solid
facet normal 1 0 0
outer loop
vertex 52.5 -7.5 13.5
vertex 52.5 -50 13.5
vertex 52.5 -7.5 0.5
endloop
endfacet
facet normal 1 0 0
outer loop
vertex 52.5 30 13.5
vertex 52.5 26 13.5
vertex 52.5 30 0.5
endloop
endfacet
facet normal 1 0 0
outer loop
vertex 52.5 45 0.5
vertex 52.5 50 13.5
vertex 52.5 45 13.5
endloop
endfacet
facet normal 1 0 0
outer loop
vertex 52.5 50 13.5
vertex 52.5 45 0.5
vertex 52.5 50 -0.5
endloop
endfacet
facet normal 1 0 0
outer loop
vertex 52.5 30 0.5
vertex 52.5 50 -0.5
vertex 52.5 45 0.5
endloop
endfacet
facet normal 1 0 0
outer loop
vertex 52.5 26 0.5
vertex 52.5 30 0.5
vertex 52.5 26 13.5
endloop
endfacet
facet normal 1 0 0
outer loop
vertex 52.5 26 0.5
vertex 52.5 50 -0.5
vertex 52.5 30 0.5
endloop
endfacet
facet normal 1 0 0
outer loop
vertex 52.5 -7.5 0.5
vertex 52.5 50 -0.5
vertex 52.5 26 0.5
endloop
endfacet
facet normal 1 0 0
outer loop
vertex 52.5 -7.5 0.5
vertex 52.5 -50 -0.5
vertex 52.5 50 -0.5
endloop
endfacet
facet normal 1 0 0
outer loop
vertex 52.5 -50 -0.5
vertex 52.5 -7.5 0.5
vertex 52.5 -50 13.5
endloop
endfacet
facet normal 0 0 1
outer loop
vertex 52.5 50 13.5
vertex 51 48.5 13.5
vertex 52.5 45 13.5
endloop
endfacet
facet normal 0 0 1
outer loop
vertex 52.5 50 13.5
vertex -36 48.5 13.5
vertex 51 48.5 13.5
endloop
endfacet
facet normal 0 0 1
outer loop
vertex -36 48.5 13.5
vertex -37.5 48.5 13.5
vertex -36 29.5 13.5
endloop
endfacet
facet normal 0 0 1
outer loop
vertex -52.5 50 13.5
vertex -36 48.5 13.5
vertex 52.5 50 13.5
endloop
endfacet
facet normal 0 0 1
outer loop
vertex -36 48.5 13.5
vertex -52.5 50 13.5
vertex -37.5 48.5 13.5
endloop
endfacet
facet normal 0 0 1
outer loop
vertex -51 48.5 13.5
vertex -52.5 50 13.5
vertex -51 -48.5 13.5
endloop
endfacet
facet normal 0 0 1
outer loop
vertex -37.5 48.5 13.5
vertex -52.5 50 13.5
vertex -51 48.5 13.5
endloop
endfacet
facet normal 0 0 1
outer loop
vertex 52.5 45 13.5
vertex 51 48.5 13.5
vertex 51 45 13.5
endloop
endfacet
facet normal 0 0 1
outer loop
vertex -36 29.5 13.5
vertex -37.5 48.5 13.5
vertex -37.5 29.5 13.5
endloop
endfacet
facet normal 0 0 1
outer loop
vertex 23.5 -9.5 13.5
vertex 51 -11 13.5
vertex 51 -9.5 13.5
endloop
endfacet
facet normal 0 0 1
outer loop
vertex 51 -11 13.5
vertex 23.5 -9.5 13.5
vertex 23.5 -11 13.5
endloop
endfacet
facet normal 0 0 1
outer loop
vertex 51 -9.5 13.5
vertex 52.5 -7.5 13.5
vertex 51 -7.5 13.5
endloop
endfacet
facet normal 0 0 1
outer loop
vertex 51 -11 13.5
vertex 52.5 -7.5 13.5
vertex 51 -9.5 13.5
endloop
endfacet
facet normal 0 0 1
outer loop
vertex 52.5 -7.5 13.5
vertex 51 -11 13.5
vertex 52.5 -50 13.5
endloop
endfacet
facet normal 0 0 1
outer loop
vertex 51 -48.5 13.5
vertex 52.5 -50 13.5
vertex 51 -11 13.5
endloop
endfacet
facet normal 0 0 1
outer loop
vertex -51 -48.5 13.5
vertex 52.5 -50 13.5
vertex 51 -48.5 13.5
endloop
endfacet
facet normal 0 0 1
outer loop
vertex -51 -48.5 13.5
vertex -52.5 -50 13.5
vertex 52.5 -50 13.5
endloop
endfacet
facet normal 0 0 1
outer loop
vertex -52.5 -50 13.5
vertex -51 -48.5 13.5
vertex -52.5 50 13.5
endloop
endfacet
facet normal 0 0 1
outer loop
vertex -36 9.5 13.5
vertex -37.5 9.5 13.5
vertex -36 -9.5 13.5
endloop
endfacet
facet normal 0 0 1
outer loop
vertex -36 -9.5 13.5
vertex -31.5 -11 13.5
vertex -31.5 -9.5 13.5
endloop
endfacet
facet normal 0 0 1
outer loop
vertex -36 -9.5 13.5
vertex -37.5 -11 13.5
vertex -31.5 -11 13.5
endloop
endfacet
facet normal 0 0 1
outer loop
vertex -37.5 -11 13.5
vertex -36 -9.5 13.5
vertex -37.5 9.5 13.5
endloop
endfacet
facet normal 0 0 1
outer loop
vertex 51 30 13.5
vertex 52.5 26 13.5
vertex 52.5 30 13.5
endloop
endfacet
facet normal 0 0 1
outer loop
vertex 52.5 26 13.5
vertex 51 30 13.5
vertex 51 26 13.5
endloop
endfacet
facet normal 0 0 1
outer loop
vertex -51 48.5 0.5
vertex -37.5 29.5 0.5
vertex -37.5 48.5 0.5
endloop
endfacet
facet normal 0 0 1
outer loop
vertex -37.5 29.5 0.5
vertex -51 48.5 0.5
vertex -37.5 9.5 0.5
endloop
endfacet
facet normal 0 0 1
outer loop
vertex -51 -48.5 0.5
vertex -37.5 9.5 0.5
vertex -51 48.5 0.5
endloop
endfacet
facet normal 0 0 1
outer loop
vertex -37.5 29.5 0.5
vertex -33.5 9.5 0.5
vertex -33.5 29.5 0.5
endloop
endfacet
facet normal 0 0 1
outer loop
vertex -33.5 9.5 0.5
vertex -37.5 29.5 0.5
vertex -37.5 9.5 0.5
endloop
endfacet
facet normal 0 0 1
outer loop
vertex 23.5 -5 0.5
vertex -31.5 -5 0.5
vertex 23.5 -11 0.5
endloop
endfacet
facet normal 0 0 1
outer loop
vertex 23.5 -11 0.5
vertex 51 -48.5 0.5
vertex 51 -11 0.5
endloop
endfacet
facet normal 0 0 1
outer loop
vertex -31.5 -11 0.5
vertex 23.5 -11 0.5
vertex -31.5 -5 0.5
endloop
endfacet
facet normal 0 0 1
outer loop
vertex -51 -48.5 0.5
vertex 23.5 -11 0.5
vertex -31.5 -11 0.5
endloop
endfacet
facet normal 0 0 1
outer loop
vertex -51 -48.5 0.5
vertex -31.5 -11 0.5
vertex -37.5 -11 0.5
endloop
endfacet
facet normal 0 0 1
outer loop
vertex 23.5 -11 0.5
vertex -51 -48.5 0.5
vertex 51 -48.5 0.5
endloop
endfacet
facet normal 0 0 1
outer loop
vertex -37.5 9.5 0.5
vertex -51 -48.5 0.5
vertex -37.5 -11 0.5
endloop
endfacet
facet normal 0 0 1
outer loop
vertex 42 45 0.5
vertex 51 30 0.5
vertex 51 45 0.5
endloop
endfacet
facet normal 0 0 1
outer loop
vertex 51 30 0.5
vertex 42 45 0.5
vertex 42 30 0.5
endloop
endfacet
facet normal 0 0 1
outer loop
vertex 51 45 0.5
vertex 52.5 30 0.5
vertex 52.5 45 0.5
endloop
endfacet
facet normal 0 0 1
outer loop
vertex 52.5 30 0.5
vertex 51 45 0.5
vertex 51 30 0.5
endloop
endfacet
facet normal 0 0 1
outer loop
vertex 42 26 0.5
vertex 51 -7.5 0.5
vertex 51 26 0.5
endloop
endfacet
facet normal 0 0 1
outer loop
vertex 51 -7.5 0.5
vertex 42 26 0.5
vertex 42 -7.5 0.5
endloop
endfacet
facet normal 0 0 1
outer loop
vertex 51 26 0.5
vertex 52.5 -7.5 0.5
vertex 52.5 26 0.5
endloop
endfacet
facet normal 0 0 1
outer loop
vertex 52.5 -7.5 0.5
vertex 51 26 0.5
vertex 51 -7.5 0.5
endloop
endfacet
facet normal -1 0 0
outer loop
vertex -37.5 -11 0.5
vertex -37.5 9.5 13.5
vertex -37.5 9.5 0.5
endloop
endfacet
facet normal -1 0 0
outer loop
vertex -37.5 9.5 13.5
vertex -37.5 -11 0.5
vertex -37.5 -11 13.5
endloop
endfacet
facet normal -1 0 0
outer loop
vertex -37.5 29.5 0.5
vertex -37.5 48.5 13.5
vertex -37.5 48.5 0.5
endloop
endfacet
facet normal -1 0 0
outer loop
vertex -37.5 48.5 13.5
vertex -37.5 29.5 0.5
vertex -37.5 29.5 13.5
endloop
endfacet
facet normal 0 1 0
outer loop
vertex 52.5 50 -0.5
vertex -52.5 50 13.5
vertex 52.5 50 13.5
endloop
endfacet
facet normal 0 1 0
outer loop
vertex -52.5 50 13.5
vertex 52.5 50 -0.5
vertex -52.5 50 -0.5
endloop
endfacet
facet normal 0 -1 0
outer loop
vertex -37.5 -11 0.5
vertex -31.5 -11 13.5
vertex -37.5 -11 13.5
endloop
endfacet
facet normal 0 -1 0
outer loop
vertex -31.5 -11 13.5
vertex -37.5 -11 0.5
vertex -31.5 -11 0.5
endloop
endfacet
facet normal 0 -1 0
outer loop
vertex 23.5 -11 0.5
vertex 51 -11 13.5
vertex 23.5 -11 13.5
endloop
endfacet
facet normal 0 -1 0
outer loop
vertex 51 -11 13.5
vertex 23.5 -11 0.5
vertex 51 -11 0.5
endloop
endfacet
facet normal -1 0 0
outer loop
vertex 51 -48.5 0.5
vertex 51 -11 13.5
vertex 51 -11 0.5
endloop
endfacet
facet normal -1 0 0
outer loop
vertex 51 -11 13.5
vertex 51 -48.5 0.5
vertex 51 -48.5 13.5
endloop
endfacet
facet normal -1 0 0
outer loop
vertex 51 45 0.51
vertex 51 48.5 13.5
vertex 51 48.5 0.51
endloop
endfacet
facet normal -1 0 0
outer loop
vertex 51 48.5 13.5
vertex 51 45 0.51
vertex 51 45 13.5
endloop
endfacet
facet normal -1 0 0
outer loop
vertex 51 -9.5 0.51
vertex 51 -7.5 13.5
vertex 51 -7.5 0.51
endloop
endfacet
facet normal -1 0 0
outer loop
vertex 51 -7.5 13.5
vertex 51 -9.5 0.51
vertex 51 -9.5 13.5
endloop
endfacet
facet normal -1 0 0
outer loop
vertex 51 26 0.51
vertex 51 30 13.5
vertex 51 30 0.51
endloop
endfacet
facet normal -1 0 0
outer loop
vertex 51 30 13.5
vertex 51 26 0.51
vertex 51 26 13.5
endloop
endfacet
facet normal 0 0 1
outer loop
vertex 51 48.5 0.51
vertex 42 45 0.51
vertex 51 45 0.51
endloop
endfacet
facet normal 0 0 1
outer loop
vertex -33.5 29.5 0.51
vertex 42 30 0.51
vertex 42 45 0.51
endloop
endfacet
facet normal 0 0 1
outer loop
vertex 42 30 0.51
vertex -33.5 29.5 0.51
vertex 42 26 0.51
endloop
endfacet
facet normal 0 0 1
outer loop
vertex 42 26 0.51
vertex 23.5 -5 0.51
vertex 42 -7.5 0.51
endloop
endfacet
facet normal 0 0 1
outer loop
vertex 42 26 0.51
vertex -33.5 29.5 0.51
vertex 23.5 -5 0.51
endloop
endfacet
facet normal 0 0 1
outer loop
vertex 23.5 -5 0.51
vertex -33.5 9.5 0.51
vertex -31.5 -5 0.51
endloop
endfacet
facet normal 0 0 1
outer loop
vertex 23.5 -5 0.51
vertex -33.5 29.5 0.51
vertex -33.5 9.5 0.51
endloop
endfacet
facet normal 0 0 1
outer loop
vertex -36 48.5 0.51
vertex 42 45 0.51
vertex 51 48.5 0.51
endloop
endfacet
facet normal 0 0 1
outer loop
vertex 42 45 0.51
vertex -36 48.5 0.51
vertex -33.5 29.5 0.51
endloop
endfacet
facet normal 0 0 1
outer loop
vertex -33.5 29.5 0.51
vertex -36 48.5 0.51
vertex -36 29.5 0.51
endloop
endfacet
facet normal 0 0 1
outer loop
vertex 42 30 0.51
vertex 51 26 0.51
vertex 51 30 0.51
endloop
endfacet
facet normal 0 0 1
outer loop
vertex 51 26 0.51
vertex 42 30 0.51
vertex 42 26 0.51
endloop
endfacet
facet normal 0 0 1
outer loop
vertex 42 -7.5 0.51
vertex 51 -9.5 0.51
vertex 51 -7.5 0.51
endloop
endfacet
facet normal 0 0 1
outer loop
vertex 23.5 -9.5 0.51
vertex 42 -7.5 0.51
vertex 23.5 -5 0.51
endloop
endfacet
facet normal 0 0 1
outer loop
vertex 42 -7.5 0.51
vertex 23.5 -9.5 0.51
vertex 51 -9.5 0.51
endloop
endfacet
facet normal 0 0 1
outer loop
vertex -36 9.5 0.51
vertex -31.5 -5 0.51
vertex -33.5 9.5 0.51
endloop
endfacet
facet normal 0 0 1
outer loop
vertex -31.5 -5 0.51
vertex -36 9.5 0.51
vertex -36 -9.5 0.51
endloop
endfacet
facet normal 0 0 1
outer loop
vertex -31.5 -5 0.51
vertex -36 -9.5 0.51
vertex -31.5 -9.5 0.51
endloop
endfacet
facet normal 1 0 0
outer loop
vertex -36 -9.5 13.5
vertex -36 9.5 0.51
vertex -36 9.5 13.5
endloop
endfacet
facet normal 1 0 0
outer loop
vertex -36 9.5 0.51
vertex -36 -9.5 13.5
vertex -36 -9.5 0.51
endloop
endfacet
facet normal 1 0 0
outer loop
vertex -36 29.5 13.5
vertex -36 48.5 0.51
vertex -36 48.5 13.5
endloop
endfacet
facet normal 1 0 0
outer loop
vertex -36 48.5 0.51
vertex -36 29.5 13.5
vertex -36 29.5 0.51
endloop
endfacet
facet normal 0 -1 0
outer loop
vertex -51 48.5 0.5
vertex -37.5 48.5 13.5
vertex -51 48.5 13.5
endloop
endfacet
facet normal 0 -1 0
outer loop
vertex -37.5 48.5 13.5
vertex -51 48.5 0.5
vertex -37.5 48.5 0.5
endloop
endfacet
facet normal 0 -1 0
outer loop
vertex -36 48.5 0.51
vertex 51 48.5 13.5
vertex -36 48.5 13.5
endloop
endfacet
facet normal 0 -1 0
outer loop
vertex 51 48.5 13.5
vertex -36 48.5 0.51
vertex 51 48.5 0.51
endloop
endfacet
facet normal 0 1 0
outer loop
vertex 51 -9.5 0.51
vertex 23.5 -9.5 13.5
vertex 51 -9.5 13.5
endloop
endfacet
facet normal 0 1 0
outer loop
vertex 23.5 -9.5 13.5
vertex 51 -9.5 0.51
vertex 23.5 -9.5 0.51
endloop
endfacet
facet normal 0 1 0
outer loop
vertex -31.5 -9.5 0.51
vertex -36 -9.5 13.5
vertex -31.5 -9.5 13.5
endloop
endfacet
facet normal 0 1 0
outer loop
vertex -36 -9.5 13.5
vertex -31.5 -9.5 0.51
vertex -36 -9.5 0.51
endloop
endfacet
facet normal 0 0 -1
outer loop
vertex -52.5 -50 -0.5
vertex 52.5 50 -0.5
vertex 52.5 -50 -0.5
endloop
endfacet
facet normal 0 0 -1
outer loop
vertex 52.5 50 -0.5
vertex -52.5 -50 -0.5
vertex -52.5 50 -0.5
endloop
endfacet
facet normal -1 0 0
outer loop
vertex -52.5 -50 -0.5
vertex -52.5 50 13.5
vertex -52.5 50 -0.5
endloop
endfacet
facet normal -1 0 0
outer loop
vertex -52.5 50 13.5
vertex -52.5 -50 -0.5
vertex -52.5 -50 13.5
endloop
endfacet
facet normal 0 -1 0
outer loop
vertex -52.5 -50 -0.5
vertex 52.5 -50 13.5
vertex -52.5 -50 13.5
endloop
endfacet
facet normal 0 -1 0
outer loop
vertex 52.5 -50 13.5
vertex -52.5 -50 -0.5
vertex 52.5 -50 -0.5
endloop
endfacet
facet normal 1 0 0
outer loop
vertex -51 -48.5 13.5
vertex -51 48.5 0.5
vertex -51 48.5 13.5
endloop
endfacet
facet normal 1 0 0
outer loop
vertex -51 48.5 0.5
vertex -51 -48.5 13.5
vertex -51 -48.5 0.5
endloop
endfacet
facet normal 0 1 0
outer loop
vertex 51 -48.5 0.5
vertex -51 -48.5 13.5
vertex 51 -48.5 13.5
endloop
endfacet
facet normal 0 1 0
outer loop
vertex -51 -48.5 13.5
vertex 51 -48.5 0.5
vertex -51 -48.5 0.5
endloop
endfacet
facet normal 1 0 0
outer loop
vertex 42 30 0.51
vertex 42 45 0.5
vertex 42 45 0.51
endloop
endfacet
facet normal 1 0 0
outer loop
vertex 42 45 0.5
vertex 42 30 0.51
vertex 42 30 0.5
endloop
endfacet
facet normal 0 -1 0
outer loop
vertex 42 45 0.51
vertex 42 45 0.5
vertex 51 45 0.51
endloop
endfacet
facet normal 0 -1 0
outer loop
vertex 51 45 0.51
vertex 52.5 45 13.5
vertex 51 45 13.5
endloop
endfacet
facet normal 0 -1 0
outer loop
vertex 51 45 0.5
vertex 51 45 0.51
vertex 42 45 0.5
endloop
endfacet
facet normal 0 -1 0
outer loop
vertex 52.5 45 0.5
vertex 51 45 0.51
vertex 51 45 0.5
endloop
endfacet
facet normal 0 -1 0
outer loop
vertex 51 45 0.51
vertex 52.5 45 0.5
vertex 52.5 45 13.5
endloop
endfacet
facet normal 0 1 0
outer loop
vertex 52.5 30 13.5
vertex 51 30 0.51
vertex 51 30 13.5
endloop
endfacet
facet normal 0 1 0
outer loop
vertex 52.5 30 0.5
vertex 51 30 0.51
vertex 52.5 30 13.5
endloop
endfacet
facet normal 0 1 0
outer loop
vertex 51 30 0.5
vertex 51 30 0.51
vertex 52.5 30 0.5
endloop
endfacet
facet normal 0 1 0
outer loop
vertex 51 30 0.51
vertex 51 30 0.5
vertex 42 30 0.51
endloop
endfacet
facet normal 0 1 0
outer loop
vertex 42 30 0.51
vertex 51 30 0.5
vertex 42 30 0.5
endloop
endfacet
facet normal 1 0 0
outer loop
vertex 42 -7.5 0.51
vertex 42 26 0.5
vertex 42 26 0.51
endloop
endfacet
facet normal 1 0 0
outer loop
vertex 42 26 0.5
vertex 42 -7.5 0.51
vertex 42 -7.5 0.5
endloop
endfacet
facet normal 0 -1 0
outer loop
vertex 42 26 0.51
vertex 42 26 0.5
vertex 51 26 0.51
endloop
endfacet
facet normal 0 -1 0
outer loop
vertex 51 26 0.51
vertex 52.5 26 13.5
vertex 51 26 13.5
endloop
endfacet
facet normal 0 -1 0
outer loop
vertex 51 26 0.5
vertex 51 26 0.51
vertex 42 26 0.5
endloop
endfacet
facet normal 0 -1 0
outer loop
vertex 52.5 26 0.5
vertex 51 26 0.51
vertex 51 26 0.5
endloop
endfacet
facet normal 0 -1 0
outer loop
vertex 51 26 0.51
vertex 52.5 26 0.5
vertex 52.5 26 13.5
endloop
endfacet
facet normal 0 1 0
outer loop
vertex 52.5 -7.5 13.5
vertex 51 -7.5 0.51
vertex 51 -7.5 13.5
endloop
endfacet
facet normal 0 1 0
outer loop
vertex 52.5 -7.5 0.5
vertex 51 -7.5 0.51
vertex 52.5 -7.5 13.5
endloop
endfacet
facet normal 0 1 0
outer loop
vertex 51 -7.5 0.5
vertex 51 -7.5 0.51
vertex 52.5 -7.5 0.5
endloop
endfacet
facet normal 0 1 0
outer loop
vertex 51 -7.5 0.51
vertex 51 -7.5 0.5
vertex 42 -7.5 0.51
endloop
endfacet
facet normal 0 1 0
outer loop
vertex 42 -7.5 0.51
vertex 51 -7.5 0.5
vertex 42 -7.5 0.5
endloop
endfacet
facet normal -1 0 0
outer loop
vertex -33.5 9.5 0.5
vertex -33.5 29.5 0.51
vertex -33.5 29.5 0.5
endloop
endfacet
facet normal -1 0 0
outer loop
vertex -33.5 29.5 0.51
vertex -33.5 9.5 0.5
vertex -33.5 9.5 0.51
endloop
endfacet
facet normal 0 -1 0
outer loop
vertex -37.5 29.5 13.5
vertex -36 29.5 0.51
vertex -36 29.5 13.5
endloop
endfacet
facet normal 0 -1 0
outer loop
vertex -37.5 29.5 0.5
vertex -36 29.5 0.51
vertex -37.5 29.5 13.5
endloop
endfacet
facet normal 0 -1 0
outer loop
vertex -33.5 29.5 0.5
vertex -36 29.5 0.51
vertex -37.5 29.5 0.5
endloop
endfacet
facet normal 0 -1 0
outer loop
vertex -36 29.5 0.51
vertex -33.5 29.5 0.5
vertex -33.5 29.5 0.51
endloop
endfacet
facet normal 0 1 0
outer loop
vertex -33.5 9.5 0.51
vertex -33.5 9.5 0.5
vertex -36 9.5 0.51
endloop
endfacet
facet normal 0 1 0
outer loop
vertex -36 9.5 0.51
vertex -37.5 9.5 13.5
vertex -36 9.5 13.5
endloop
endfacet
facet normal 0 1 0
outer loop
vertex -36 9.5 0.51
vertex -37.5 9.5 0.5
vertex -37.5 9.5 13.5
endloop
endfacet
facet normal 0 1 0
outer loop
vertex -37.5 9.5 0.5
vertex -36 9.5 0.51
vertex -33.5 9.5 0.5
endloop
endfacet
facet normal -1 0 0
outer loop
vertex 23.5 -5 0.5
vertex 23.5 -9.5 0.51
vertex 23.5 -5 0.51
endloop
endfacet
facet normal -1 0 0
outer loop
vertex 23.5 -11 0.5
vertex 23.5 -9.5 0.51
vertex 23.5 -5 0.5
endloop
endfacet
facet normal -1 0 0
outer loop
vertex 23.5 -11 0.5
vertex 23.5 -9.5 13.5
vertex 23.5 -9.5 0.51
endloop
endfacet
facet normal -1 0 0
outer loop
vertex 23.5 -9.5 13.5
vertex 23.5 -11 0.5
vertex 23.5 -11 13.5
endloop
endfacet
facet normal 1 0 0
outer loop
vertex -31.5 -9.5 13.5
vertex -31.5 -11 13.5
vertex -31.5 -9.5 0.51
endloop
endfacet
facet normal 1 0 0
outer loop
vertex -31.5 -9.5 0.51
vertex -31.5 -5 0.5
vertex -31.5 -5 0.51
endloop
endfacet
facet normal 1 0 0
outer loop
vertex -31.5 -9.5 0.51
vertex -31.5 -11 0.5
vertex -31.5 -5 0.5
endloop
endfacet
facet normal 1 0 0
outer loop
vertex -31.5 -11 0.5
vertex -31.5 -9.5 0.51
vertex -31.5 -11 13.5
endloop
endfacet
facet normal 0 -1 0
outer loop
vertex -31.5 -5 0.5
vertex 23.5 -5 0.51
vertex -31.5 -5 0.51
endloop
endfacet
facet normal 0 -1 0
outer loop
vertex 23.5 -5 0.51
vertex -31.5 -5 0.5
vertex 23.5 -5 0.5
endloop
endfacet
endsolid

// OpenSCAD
pi_x = 85;
pi_y = 56;
pi_z = 13;

x_clearance = 1;
y_clearance = 1;

wall_thickness = 1.5;

x_buffer = 15;
y_buffer = 15;

usb_buffer = 24;

floor_z = 1;

usb_y = 15;

ethernet_y = 20;





 cube([pi_x+x_buffer+(x_clearance)*2
        , pi_y+ usb_buffer + y_buffer + (y_clearance)*2, 
        floor_z], center=true);
    
difference(){

union(){
    
    translate([x_buffer/2,(y_buffer+usb_buffer)/2,(floor_z + pi_z)/2])
    difference(){
    cube([pi_x+(x_clearance+wall_thickness)*2, 
          pi_y+(y_clearance+wall_thickness)*2,
          pi_z], center=true);

    translate([0,0,.01])   
    cube([pi_x+(x_clearance)*2, 
          pi_y+(y_clearance)*2,
          pi_z], center=true);
    }
    
    difference(){
    translate([0,0,pi_z/2])
    cube([pi_x+x_buffer+(x_clearance + wall_thickness)*2
        , pi_y+ usb_buffer + y_buffer + (y_clearance + wall_thickness)*2, 
        floor_z+pi_z], center=true);
    translate([0,0,pi_z/2+.1])
    cube([pi_x+x_buffer+(x_clearance)*2
        , pi_y+ usb_buffer + y_buffer + (y_clearance)*2, 
        floor_z+pi_z], center=true);
    }
}

translate([(pi_x+x_buffer + x_clearance)/2+wall_thickness,
(pi_y + usb_buffer + y_buffer)/2 - y_clearance - 9
,pi_z/2+1])
cube([20, usb_y, pi_z+1],center=true);

translate([(pi_x+x_buffer + x_clearance)/2+wall_thickness,
(pi_y + usb_buffer + y_buffer)/2 - y_clearance - 28 
,pi_z/2+1])
cube([20, usb_y, pi_z+1],center=true);

translate([(pi_x+x_buffer + x_clearance)/2+wall_thickness,
(pi_y + usb_buffer + y_buffer)/2 - y_clearance - 44 
,(pi_z+2)/2])
cube([20, ethernet_y, pi_z+1],center=true);

translate([-(pi_x)/2+4,
(pi_y + usb_buffer + y_buffer)/2 - 27 - 1
,(pi_z+2)/2])
cube([10, 20, pi_z+1],center=true);

translate([-4,-10,pi_z/2+floor_z/2+.1])
cube([55,10,pi_z+.2],center=true);
}
